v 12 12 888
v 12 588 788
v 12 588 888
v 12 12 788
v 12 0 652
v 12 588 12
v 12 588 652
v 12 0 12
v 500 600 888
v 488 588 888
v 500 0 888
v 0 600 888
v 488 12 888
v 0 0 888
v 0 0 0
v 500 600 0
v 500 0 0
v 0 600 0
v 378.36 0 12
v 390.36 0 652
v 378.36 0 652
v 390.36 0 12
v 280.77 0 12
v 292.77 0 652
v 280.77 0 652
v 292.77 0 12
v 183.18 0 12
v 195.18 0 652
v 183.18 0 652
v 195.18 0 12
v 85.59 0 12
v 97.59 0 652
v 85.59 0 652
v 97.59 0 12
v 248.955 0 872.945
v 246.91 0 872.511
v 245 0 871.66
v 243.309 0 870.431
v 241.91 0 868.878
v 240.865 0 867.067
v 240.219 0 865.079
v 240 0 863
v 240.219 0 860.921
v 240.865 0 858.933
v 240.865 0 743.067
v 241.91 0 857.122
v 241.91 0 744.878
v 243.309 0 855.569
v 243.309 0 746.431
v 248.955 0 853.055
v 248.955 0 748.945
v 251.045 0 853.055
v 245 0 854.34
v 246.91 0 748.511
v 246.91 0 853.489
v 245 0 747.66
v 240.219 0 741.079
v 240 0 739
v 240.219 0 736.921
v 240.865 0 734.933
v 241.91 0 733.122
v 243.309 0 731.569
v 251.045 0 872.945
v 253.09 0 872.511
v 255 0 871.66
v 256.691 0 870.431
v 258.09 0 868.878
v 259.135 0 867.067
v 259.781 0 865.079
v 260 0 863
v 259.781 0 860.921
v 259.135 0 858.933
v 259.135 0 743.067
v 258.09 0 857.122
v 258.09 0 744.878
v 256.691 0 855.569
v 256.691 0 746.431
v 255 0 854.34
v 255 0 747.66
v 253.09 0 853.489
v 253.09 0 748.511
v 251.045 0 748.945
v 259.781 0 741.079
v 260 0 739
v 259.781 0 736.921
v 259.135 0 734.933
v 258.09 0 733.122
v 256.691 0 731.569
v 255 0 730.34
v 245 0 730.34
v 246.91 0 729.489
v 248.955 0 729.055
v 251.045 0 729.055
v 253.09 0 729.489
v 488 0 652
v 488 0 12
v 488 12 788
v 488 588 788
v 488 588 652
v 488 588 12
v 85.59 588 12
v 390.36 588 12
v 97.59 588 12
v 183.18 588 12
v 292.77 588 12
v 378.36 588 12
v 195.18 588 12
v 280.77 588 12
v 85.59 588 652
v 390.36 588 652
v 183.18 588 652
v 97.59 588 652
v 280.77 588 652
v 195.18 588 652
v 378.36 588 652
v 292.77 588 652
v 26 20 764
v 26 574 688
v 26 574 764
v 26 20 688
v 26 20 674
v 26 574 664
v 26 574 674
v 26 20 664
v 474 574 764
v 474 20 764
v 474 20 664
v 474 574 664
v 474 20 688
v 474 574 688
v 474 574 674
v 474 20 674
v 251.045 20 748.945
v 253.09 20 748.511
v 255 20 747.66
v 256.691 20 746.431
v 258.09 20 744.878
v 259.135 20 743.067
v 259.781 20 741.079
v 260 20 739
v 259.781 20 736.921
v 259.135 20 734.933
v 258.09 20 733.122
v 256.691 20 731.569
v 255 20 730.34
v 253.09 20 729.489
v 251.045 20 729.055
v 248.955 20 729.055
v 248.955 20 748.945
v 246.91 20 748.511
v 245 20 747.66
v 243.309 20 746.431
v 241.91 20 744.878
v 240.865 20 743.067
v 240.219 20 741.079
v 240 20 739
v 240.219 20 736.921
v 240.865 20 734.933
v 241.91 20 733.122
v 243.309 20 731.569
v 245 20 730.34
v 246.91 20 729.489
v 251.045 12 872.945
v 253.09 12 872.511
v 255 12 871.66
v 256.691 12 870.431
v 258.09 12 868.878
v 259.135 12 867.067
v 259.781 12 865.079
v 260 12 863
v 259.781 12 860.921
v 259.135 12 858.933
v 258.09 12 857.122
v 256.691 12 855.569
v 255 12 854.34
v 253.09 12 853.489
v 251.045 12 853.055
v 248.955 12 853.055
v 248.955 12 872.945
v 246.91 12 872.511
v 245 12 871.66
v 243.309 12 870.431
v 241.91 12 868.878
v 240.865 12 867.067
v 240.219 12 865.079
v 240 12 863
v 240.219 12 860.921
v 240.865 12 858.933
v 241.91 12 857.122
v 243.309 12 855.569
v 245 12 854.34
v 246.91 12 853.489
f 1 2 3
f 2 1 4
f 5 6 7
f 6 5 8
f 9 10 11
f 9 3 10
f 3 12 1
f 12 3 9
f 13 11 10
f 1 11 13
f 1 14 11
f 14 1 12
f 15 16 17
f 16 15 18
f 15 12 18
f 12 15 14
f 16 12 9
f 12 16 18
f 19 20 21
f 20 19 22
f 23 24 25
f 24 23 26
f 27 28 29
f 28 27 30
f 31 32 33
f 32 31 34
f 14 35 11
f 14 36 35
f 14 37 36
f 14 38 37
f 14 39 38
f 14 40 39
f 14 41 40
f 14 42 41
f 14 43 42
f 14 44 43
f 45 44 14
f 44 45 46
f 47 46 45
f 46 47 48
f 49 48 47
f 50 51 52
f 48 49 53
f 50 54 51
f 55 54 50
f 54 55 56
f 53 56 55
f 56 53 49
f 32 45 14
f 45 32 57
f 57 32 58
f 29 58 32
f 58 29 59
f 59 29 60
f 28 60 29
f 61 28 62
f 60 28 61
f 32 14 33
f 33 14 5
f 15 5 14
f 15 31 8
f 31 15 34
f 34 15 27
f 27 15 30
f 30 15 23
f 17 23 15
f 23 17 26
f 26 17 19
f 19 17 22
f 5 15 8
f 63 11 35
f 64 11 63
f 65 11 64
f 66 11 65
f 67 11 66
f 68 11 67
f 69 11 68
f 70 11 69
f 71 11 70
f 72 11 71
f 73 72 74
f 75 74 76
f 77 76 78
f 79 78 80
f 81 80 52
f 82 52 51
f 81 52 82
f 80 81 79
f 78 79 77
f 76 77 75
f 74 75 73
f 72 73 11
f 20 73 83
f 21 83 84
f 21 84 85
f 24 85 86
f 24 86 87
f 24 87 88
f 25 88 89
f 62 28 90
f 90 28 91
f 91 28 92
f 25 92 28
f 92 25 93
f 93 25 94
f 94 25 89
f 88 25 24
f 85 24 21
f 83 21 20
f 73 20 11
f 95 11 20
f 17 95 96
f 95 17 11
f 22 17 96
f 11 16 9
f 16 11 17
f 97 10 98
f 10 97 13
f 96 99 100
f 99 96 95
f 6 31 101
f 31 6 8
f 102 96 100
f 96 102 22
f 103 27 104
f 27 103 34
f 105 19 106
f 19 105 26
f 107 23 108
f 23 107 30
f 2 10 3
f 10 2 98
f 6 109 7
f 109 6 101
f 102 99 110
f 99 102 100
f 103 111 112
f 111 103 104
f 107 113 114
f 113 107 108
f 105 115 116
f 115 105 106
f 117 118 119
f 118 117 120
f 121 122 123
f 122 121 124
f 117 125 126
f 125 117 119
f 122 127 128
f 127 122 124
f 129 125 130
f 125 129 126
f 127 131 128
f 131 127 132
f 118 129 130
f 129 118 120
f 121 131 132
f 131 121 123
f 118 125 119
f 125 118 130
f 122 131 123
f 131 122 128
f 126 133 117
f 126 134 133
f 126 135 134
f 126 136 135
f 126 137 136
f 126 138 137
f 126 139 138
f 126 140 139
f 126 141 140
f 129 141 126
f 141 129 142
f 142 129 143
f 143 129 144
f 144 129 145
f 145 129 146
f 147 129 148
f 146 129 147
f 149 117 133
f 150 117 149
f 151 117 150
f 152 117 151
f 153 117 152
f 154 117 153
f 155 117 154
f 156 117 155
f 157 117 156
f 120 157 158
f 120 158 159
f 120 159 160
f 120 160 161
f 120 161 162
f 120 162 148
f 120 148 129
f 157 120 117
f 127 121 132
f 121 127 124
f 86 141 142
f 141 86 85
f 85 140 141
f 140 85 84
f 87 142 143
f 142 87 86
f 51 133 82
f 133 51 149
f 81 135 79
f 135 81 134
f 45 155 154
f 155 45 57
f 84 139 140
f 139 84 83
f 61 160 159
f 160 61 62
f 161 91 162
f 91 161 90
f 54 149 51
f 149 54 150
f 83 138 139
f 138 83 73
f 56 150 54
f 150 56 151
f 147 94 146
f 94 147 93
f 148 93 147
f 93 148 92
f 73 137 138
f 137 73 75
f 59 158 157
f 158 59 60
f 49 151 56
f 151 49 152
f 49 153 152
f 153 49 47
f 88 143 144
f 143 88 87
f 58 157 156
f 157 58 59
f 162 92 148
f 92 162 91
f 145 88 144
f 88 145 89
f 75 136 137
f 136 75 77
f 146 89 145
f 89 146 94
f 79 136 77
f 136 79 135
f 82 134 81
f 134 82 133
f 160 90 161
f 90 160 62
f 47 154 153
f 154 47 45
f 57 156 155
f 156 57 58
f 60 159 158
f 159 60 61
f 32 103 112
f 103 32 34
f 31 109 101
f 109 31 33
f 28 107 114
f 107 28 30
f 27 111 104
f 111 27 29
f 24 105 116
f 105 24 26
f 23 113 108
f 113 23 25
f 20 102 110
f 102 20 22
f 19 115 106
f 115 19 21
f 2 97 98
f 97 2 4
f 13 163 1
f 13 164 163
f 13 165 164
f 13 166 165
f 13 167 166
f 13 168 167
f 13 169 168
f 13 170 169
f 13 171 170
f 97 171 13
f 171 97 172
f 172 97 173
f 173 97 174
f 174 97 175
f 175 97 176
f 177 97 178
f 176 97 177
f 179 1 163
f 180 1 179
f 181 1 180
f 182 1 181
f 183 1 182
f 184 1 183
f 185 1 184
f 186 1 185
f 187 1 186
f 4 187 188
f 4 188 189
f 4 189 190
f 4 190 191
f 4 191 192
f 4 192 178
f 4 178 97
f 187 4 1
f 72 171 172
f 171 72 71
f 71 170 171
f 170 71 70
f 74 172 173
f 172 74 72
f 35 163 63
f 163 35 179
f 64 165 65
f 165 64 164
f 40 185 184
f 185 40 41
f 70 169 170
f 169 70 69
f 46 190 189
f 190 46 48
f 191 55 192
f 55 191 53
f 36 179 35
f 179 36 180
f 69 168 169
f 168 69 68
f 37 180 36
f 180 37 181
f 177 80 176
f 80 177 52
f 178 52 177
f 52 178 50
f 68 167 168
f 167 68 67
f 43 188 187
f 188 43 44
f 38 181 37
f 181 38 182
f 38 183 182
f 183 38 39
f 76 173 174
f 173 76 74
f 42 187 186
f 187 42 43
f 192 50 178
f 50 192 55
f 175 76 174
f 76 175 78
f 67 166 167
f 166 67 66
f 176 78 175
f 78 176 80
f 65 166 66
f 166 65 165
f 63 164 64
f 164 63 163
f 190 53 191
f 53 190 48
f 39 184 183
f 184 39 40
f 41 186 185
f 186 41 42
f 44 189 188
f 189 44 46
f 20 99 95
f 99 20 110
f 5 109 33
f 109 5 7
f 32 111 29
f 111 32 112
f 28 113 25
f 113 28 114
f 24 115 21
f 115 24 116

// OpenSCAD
// file: dovetail-drawer.scad
/*

    Dovetail Drawer
    
    By Anton Augustsson


*/

// use dovtail library

module dovetailDrawer (
    thicknessBottom,
    thicknessSide,
    thicknessFront,
    lenghtDrawer,
    widthDrawer,
    heightDrawer,
    xDrawer,yDrawer,zDrawer,
    yRotate
    ){
/*
    ---------- Local varibles ---------- 
*/

length = lenghtDrawer;
width  = widthDrawer;
height = heightDrawer;

x=xDrawer;
y=yDrawer;
z=zDrawer;

/*
    ---------- Code ---------- 
*/

translate([
    x,
    y,
    z]) 
rotate([0,yRotate,0])
difference () {
union () {

// Left
color("Wheat")
translate([
    0,
    thicknessFront/4,
    0]) 
cube(size = [
    thicknessSide,
    length-thicknessFront/4,
    height]);

// Right
color("Wheat")
translate([
    width-thicknessSide,
    thicknessFront/4,
    0]) 
cube(size = [
    thicknessSide,
    length-thicknessFront/4,
    height]);
    
// Bottom 
color("Wheat")
translate([
    thicknessSide/2,
    thicknessFront,
    10]) 
cube(size = [
    width-thicknessSide,
    length-thicknessFront-thicknessSide,
    thicknessBottom]);

// Back
color("Wheat")
translate([
    0,
    length-thicknessSide,
    0]) 
cube(size = [
    width,
    thicknessSide,
    height]);

// Front
color("BurlyWood")
translate([
    0,
    0,
    0]) 
cube(size = [
    width,
    thicknessFront,
    height]);    
}


translate([
    width/2,                   
    -1,   
    height/4*3
    ])  
rotate([270,0,0])
cylinder(
    h = thicknessFront+2,    
    r = 10        
    );      

}}
    
/*
    ---------- Example ---------- 
*/


thicknessBottom = 14;
thicknessSide   = 14;
thicknessFront  = 20;

length = 500;
width  = 600;
height = 100;


x=0;
y=0;
z=0;
yRotate=0;

dovetailDrawer (
    thicknessBottom,
    thicknessSide,
    thicknessFront,
    length,
    width,
    height,
    x,y,z,
    yRotate
    );
// file: cabinet.scad
/*

    Cabinet
    
    By Anton Augustsson


*/

module cabinet (
    thickness,
    length,
    width,
    height
    ){
/*
    ---------- Local varibles ---------- 
*/



/*
    ---------- Code ---------- 
*/


union () {

// Left
translate([
    0,
    0,
    0]) 
cube(size = [
    thickness,
    width,
    height-thickness]);

// Right
translate([
    length-thickness,
    0,
    0]) 
cube(size = [
    thickness,
    width,
    height-thickness]);
    
// Bottom 
translate([
    thickness,
    0,
    0]) 
cube(size = [
    length
    -thickness*2,
    width-thickness,
    thickness]);

// Back
translate([
    thickness,
    width-thickness,
    0]) 
cube(size = [
    length
    -thickness*2,
    thickness,
    height-thickness]);
}}



/*
    ---------- Example ---------- 
*/


thickness = 12;

length = 600;
width  = 600;
height = 900;

cabinet (
    thickness,
    length,
    width,
    height
    );
// main file
/*

    Second Tird Section Left Table
    
    By Anton Augustsson


*/

use <cabinet.scad>;
use <dovetail-drawer.scad>;

module secondTirdSectionLeftTable (
    plywoodThickness,
    lengthMiddleSection,
    lengthSecondSection,
    length,
    widthCabinet,
    widthCabinetDoor,
    widthTable,
    width,
    heightTable,
    heightCabinet,
    x,y,z
    ){

/*
    ---------- Local varibles ---------- 
*/

thickness = plywoodThickness;

length = lengthSecondSection+
        lengthTirdSection;
width  = widthTable+widthCabinet;
height = heightTable;

drawerHeight = 100;
referenceSurfaceHeight = drawerHeight;

numberOfDividers = 4;
increse = (length-thickness*2
        -numberOfDividers*thickness)
        /(numberOfDividers+1)
        -0.01;
        
/*
    ---------- Code ---------- 
*/


translate([
	x,
	y,
	z,])

union () {

cabinet (
    thickness,
    length,
    width,
    height
    );

// Top shelf
translate([
    thickness,
    0,
    height-thickness*3
    -referenceSurfaceHeight]) 
cube(size = [
    length-thickness*2,
    width,
    thickness*2]);

// Drawer shelf
translate([
    thickness,
    0,
    height-thickness*4
    -referenceSurfaceHeight
    -drawerHeight]) 
cube(size = [
    length-thickness*2,
    width,
    thickness]);
   
// Drawer lower
dovetailDrawer (
    14,
    14,
    20,
    width-thickness,
    length-thickness*2,
    drawerHeight,
    thickness,0,height-thickness*3
    -referenceSurfaceHeight
    -drawerHeight,
    0
    );
    
// Devider 
for(i = [
    increse:
    increse+thickness: 
    length-thickness*2-increse
    ])
    translate([
        i,
        0,
        thickness]) 
        cube(size = [
        thickness,
        width,
        height-thickness*4
        -referenceSurfaceHeight
        -drawerHeight]);

difference () {
// Latch
translate([
    thickness,
    0,
    height-thickness-drawerHeight]) 
cube(size = [
    length-thickness*2,
    thickness,
    drawerHeight]);

translate([
    length/2,                   
    -1,   
    (height-thickness-drawerHeight)+
    (drawerHeight/4*3)
    ])  
rotate([270,0,0])
cylinder(
    h = thickness+2,    
    r = 10        
    );      
}
}}



/*
    ---------- Example ---------- 
*/


plywoodThickness = 12;

lengthMiddleSection = 600;
lengthSecondSection = lengthMiddleSection/2;
lengthTirdSection   = 200;
length=lengthMiddleSection
    +lengthSecondSection*2
    +lengthTirdSection*2;

widthCabinet     = 300;
widthCabinetDoor = widthCabinet/3;
widthTable       = 300;
width            = widthCabinet+widthTable;

heightTable   = 900;
heightCabinet = 900;


x=0;
y=0;
z=0;

secondTirdSectionLeftTable (
    plywoodThickness,
    lengthMiddleSection,
    lengthSecondSection,
    length,
    widthCabinet,
    widthCabinetDoor,
    widthTable,
    width,
    heightTable,
    heightCabinet,
    x,y,z
    );
